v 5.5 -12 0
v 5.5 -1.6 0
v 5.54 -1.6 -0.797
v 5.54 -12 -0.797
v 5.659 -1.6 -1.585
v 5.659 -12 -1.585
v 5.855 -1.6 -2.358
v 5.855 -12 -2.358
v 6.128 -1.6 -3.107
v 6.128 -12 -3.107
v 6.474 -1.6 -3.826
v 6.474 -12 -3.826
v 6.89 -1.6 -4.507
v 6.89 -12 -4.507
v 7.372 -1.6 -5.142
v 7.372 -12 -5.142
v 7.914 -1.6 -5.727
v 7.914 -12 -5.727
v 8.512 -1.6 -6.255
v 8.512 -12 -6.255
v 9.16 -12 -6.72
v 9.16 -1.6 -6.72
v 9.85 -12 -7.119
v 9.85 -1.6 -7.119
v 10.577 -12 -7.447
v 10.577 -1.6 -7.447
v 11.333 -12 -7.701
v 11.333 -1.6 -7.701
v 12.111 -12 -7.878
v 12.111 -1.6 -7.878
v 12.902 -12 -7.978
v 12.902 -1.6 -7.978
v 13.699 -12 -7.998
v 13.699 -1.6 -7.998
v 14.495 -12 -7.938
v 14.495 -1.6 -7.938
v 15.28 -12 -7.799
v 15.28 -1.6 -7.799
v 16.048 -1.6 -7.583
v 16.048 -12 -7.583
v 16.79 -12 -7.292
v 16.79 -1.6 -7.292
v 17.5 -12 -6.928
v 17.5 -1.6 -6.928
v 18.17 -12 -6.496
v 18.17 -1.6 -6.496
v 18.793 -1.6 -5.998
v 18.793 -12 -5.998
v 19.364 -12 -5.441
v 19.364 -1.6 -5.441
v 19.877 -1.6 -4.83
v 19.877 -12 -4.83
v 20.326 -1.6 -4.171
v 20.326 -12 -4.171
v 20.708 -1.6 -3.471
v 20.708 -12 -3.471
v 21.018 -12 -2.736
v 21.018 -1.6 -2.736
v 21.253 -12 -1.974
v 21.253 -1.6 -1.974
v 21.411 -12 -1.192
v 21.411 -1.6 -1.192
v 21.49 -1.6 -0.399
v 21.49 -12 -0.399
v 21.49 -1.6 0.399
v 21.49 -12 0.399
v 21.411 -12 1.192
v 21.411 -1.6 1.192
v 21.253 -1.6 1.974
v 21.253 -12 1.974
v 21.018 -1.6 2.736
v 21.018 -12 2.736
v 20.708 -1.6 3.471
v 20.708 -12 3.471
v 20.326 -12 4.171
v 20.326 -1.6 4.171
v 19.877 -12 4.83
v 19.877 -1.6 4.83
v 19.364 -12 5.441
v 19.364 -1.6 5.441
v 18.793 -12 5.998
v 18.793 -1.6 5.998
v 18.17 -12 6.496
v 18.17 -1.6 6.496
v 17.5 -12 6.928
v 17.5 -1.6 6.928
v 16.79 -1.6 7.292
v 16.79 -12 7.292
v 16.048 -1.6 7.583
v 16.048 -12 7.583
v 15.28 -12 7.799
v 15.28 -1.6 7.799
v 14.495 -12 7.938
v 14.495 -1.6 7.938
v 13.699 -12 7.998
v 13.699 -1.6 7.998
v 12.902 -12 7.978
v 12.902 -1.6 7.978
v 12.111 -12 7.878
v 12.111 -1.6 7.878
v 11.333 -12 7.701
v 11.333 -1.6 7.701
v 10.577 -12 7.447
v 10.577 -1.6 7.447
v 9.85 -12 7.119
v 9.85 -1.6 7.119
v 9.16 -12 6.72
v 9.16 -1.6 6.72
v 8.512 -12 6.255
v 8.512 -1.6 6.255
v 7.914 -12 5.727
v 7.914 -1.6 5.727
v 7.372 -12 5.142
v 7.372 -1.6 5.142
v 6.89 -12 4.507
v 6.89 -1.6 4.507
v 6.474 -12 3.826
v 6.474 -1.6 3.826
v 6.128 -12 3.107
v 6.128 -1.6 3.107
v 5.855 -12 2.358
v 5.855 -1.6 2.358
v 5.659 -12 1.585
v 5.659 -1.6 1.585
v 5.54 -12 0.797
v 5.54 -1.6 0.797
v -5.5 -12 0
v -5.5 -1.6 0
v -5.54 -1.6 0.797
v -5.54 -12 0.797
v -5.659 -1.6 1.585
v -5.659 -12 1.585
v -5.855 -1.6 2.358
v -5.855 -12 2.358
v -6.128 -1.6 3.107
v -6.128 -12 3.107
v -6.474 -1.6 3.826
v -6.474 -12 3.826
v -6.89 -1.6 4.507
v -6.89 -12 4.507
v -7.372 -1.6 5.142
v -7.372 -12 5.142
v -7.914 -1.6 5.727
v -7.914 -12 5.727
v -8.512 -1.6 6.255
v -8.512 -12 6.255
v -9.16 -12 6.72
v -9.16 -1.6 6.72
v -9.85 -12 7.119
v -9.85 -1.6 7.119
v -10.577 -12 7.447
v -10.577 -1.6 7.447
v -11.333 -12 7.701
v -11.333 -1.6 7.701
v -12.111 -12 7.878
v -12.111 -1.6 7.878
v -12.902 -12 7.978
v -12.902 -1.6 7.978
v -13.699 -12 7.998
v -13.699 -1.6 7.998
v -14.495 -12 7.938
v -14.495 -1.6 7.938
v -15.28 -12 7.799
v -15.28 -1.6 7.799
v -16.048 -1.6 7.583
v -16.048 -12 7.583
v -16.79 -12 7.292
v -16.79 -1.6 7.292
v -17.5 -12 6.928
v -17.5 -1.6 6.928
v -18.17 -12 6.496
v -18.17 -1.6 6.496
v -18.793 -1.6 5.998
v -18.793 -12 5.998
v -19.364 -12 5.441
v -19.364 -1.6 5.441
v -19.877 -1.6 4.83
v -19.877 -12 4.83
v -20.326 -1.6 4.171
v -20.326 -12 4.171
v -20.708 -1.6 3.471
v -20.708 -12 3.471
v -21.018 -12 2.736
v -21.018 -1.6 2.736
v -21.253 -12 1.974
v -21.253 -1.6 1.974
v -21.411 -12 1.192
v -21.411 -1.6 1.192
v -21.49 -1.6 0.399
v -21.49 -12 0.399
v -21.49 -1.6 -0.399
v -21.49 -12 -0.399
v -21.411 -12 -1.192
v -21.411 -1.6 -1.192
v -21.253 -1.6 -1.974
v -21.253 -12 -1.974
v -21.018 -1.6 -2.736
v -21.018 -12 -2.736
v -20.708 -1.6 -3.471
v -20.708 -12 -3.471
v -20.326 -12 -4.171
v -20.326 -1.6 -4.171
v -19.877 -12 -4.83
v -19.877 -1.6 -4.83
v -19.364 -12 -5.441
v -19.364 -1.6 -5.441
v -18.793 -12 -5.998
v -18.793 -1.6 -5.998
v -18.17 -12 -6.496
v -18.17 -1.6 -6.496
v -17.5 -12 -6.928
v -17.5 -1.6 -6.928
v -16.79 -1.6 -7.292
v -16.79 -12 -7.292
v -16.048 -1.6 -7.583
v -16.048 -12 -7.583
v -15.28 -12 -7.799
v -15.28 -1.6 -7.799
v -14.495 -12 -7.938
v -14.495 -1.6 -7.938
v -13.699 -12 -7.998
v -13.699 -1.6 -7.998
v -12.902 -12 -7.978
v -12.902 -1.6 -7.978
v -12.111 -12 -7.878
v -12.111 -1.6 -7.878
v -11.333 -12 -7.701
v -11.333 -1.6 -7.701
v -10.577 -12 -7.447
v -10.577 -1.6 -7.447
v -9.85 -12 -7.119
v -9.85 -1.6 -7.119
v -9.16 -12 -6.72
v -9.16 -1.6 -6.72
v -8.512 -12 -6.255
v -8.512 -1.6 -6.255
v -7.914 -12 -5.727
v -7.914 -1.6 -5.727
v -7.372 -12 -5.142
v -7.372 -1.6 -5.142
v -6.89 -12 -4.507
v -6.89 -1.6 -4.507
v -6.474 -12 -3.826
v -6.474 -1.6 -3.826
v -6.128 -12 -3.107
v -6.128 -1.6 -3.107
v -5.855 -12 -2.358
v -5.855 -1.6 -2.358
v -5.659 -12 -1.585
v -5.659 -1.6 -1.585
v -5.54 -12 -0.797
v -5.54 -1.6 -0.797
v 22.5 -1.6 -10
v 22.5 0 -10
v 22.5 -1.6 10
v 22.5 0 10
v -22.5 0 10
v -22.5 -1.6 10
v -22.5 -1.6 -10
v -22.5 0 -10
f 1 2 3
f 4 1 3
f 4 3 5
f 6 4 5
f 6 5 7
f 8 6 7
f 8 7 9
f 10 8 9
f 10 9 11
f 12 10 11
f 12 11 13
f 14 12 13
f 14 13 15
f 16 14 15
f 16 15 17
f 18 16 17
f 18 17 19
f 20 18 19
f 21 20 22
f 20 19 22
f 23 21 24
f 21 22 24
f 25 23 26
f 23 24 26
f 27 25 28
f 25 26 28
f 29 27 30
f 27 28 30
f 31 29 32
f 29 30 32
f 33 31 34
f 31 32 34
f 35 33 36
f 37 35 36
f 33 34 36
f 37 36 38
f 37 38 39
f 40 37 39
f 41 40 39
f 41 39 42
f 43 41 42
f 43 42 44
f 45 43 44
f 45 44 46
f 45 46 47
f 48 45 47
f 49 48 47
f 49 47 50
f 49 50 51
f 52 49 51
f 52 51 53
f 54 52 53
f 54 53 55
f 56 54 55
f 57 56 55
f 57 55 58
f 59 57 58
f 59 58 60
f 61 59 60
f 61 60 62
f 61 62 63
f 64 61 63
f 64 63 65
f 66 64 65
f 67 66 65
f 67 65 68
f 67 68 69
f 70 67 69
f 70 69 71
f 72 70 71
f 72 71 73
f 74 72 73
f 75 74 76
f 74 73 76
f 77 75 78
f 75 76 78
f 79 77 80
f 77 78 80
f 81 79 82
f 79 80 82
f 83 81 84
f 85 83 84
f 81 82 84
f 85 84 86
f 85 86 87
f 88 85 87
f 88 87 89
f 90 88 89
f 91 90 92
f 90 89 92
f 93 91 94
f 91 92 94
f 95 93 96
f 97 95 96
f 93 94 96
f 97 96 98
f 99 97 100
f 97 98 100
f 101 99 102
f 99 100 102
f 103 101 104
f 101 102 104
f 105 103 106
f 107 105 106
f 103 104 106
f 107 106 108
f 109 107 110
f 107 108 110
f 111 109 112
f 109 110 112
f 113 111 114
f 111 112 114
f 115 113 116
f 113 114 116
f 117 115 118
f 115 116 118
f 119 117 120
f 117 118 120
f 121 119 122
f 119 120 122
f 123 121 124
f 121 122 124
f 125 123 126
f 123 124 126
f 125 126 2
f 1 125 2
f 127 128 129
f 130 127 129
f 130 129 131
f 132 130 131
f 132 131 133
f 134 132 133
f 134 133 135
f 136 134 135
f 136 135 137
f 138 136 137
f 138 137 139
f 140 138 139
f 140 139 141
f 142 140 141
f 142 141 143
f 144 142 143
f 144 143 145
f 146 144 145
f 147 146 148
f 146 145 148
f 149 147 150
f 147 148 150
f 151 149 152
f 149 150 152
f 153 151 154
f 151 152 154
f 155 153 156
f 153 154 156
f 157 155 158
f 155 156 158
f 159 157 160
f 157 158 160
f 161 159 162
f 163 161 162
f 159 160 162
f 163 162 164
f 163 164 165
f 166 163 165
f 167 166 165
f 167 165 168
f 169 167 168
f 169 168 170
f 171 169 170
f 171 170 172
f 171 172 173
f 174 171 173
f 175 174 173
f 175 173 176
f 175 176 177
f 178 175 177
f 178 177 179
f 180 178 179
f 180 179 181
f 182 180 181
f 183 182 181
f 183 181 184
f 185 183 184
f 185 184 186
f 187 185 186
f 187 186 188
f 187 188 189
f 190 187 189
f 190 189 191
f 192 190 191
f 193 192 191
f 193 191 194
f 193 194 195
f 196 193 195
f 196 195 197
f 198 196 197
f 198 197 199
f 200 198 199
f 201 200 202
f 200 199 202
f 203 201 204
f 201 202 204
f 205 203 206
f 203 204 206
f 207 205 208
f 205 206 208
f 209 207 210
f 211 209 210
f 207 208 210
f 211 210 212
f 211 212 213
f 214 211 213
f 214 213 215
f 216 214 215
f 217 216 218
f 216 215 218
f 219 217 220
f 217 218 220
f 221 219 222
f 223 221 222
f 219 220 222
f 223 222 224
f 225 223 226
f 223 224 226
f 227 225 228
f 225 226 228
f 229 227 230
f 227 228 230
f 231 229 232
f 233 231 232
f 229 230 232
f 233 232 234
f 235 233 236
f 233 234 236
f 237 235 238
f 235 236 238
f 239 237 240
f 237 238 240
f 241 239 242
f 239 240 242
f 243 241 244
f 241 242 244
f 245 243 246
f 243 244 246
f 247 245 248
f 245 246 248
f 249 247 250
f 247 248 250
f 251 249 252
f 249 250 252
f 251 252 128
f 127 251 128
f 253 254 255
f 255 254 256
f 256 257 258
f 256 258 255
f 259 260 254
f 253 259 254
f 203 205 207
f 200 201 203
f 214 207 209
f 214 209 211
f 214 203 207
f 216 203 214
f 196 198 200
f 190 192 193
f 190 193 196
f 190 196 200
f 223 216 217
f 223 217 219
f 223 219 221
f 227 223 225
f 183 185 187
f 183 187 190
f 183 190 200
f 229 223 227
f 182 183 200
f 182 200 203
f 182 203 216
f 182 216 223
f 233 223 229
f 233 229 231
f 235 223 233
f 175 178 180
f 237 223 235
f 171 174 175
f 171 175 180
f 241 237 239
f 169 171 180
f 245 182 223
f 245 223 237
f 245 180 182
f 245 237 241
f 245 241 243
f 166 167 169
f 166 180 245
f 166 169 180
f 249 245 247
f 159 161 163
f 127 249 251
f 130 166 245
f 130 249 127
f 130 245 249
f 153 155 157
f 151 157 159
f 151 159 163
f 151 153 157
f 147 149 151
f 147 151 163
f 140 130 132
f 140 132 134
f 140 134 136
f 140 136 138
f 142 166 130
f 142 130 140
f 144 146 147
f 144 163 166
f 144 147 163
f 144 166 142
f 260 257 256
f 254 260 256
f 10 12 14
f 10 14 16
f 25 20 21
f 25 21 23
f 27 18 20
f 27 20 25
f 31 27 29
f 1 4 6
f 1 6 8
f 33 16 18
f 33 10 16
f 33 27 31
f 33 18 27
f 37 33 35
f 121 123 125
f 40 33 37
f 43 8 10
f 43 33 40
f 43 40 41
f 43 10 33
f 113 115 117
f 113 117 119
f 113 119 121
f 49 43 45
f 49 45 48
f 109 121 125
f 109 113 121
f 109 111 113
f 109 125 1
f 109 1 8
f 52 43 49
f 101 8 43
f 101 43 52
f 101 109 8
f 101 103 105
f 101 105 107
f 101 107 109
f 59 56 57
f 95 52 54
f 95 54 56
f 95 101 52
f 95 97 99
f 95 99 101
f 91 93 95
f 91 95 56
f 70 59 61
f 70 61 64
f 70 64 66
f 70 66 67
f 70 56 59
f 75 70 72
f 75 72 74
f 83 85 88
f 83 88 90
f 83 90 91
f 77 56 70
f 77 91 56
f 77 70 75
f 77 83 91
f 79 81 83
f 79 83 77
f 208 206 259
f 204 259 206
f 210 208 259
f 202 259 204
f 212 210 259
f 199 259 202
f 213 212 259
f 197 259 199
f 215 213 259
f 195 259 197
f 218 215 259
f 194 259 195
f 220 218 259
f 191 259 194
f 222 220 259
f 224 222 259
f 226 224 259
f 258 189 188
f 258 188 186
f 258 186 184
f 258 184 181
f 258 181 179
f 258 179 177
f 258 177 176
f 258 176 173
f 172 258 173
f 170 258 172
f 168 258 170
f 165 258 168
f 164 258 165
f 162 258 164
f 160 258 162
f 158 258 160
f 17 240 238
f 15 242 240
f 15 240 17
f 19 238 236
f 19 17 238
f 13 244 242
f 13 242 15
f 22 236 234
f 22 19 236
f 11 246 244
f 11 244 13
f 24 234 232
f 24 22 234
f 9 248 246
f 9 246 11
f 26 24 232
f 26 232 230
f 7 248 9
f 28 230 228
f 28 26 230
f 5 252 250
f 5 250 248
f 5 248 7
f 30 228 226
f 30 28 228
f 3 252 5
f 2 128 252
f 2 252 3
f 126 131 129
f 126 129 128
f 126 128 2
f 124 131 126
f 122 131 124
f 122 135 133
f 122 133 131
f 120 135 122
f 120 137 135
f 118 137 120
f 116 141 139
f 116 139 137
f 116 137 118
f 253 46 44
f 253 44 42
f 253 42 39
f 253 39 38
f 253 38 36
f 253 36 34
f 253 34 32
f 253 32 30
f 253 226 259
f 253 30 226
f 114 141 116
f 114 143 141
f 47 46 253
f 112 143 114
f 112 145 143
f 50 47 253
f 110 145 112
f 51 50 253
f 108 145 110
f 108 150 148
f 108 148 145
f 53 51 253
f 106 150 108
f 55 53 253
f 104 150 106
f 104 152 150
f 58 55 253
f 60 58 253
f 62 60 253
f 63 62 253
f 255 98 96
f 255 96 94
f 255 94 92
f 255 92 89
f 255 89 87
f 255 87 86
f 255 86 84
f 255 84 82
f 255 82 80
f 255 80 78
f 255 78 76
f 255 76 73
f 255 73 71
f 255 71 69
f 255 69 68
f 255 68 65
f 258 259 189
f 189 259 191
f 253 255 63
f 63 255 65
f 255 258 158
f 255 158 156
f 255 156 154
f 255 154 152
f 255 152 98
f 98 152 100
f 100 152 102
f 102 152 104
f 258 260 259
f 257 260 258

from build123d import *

# Parameters (mm, degrees)
F0_W     = 45
F0_H     = 20
F1_DEPTH = 1.6
F2_R     = 8
F3_DEPTH = 12


with BuildPart() as f1:
    # F0 (on Front) → F1 (new body)
    with BuildSketch(Plane.XZ):
        Rectangle(F0_W, F0_H)
    extrude(amount=F1_DEPTH)

    # F2 (on Front) → F3 (join)
    with BuildSketch(Plane.XZ):
        with Locations((-13.5, 0)):
            Circle(F2_R)
        with BuildLine():
            ThreePointArc((21.5, 0), (13.5, 8), (5.5, 0))
            ThreePointArc((5.5, 0), (13.5, -8), (21.5, 0))
        make_face()
    extrude(amount=F3_DEPTH)


solid = f1.part
